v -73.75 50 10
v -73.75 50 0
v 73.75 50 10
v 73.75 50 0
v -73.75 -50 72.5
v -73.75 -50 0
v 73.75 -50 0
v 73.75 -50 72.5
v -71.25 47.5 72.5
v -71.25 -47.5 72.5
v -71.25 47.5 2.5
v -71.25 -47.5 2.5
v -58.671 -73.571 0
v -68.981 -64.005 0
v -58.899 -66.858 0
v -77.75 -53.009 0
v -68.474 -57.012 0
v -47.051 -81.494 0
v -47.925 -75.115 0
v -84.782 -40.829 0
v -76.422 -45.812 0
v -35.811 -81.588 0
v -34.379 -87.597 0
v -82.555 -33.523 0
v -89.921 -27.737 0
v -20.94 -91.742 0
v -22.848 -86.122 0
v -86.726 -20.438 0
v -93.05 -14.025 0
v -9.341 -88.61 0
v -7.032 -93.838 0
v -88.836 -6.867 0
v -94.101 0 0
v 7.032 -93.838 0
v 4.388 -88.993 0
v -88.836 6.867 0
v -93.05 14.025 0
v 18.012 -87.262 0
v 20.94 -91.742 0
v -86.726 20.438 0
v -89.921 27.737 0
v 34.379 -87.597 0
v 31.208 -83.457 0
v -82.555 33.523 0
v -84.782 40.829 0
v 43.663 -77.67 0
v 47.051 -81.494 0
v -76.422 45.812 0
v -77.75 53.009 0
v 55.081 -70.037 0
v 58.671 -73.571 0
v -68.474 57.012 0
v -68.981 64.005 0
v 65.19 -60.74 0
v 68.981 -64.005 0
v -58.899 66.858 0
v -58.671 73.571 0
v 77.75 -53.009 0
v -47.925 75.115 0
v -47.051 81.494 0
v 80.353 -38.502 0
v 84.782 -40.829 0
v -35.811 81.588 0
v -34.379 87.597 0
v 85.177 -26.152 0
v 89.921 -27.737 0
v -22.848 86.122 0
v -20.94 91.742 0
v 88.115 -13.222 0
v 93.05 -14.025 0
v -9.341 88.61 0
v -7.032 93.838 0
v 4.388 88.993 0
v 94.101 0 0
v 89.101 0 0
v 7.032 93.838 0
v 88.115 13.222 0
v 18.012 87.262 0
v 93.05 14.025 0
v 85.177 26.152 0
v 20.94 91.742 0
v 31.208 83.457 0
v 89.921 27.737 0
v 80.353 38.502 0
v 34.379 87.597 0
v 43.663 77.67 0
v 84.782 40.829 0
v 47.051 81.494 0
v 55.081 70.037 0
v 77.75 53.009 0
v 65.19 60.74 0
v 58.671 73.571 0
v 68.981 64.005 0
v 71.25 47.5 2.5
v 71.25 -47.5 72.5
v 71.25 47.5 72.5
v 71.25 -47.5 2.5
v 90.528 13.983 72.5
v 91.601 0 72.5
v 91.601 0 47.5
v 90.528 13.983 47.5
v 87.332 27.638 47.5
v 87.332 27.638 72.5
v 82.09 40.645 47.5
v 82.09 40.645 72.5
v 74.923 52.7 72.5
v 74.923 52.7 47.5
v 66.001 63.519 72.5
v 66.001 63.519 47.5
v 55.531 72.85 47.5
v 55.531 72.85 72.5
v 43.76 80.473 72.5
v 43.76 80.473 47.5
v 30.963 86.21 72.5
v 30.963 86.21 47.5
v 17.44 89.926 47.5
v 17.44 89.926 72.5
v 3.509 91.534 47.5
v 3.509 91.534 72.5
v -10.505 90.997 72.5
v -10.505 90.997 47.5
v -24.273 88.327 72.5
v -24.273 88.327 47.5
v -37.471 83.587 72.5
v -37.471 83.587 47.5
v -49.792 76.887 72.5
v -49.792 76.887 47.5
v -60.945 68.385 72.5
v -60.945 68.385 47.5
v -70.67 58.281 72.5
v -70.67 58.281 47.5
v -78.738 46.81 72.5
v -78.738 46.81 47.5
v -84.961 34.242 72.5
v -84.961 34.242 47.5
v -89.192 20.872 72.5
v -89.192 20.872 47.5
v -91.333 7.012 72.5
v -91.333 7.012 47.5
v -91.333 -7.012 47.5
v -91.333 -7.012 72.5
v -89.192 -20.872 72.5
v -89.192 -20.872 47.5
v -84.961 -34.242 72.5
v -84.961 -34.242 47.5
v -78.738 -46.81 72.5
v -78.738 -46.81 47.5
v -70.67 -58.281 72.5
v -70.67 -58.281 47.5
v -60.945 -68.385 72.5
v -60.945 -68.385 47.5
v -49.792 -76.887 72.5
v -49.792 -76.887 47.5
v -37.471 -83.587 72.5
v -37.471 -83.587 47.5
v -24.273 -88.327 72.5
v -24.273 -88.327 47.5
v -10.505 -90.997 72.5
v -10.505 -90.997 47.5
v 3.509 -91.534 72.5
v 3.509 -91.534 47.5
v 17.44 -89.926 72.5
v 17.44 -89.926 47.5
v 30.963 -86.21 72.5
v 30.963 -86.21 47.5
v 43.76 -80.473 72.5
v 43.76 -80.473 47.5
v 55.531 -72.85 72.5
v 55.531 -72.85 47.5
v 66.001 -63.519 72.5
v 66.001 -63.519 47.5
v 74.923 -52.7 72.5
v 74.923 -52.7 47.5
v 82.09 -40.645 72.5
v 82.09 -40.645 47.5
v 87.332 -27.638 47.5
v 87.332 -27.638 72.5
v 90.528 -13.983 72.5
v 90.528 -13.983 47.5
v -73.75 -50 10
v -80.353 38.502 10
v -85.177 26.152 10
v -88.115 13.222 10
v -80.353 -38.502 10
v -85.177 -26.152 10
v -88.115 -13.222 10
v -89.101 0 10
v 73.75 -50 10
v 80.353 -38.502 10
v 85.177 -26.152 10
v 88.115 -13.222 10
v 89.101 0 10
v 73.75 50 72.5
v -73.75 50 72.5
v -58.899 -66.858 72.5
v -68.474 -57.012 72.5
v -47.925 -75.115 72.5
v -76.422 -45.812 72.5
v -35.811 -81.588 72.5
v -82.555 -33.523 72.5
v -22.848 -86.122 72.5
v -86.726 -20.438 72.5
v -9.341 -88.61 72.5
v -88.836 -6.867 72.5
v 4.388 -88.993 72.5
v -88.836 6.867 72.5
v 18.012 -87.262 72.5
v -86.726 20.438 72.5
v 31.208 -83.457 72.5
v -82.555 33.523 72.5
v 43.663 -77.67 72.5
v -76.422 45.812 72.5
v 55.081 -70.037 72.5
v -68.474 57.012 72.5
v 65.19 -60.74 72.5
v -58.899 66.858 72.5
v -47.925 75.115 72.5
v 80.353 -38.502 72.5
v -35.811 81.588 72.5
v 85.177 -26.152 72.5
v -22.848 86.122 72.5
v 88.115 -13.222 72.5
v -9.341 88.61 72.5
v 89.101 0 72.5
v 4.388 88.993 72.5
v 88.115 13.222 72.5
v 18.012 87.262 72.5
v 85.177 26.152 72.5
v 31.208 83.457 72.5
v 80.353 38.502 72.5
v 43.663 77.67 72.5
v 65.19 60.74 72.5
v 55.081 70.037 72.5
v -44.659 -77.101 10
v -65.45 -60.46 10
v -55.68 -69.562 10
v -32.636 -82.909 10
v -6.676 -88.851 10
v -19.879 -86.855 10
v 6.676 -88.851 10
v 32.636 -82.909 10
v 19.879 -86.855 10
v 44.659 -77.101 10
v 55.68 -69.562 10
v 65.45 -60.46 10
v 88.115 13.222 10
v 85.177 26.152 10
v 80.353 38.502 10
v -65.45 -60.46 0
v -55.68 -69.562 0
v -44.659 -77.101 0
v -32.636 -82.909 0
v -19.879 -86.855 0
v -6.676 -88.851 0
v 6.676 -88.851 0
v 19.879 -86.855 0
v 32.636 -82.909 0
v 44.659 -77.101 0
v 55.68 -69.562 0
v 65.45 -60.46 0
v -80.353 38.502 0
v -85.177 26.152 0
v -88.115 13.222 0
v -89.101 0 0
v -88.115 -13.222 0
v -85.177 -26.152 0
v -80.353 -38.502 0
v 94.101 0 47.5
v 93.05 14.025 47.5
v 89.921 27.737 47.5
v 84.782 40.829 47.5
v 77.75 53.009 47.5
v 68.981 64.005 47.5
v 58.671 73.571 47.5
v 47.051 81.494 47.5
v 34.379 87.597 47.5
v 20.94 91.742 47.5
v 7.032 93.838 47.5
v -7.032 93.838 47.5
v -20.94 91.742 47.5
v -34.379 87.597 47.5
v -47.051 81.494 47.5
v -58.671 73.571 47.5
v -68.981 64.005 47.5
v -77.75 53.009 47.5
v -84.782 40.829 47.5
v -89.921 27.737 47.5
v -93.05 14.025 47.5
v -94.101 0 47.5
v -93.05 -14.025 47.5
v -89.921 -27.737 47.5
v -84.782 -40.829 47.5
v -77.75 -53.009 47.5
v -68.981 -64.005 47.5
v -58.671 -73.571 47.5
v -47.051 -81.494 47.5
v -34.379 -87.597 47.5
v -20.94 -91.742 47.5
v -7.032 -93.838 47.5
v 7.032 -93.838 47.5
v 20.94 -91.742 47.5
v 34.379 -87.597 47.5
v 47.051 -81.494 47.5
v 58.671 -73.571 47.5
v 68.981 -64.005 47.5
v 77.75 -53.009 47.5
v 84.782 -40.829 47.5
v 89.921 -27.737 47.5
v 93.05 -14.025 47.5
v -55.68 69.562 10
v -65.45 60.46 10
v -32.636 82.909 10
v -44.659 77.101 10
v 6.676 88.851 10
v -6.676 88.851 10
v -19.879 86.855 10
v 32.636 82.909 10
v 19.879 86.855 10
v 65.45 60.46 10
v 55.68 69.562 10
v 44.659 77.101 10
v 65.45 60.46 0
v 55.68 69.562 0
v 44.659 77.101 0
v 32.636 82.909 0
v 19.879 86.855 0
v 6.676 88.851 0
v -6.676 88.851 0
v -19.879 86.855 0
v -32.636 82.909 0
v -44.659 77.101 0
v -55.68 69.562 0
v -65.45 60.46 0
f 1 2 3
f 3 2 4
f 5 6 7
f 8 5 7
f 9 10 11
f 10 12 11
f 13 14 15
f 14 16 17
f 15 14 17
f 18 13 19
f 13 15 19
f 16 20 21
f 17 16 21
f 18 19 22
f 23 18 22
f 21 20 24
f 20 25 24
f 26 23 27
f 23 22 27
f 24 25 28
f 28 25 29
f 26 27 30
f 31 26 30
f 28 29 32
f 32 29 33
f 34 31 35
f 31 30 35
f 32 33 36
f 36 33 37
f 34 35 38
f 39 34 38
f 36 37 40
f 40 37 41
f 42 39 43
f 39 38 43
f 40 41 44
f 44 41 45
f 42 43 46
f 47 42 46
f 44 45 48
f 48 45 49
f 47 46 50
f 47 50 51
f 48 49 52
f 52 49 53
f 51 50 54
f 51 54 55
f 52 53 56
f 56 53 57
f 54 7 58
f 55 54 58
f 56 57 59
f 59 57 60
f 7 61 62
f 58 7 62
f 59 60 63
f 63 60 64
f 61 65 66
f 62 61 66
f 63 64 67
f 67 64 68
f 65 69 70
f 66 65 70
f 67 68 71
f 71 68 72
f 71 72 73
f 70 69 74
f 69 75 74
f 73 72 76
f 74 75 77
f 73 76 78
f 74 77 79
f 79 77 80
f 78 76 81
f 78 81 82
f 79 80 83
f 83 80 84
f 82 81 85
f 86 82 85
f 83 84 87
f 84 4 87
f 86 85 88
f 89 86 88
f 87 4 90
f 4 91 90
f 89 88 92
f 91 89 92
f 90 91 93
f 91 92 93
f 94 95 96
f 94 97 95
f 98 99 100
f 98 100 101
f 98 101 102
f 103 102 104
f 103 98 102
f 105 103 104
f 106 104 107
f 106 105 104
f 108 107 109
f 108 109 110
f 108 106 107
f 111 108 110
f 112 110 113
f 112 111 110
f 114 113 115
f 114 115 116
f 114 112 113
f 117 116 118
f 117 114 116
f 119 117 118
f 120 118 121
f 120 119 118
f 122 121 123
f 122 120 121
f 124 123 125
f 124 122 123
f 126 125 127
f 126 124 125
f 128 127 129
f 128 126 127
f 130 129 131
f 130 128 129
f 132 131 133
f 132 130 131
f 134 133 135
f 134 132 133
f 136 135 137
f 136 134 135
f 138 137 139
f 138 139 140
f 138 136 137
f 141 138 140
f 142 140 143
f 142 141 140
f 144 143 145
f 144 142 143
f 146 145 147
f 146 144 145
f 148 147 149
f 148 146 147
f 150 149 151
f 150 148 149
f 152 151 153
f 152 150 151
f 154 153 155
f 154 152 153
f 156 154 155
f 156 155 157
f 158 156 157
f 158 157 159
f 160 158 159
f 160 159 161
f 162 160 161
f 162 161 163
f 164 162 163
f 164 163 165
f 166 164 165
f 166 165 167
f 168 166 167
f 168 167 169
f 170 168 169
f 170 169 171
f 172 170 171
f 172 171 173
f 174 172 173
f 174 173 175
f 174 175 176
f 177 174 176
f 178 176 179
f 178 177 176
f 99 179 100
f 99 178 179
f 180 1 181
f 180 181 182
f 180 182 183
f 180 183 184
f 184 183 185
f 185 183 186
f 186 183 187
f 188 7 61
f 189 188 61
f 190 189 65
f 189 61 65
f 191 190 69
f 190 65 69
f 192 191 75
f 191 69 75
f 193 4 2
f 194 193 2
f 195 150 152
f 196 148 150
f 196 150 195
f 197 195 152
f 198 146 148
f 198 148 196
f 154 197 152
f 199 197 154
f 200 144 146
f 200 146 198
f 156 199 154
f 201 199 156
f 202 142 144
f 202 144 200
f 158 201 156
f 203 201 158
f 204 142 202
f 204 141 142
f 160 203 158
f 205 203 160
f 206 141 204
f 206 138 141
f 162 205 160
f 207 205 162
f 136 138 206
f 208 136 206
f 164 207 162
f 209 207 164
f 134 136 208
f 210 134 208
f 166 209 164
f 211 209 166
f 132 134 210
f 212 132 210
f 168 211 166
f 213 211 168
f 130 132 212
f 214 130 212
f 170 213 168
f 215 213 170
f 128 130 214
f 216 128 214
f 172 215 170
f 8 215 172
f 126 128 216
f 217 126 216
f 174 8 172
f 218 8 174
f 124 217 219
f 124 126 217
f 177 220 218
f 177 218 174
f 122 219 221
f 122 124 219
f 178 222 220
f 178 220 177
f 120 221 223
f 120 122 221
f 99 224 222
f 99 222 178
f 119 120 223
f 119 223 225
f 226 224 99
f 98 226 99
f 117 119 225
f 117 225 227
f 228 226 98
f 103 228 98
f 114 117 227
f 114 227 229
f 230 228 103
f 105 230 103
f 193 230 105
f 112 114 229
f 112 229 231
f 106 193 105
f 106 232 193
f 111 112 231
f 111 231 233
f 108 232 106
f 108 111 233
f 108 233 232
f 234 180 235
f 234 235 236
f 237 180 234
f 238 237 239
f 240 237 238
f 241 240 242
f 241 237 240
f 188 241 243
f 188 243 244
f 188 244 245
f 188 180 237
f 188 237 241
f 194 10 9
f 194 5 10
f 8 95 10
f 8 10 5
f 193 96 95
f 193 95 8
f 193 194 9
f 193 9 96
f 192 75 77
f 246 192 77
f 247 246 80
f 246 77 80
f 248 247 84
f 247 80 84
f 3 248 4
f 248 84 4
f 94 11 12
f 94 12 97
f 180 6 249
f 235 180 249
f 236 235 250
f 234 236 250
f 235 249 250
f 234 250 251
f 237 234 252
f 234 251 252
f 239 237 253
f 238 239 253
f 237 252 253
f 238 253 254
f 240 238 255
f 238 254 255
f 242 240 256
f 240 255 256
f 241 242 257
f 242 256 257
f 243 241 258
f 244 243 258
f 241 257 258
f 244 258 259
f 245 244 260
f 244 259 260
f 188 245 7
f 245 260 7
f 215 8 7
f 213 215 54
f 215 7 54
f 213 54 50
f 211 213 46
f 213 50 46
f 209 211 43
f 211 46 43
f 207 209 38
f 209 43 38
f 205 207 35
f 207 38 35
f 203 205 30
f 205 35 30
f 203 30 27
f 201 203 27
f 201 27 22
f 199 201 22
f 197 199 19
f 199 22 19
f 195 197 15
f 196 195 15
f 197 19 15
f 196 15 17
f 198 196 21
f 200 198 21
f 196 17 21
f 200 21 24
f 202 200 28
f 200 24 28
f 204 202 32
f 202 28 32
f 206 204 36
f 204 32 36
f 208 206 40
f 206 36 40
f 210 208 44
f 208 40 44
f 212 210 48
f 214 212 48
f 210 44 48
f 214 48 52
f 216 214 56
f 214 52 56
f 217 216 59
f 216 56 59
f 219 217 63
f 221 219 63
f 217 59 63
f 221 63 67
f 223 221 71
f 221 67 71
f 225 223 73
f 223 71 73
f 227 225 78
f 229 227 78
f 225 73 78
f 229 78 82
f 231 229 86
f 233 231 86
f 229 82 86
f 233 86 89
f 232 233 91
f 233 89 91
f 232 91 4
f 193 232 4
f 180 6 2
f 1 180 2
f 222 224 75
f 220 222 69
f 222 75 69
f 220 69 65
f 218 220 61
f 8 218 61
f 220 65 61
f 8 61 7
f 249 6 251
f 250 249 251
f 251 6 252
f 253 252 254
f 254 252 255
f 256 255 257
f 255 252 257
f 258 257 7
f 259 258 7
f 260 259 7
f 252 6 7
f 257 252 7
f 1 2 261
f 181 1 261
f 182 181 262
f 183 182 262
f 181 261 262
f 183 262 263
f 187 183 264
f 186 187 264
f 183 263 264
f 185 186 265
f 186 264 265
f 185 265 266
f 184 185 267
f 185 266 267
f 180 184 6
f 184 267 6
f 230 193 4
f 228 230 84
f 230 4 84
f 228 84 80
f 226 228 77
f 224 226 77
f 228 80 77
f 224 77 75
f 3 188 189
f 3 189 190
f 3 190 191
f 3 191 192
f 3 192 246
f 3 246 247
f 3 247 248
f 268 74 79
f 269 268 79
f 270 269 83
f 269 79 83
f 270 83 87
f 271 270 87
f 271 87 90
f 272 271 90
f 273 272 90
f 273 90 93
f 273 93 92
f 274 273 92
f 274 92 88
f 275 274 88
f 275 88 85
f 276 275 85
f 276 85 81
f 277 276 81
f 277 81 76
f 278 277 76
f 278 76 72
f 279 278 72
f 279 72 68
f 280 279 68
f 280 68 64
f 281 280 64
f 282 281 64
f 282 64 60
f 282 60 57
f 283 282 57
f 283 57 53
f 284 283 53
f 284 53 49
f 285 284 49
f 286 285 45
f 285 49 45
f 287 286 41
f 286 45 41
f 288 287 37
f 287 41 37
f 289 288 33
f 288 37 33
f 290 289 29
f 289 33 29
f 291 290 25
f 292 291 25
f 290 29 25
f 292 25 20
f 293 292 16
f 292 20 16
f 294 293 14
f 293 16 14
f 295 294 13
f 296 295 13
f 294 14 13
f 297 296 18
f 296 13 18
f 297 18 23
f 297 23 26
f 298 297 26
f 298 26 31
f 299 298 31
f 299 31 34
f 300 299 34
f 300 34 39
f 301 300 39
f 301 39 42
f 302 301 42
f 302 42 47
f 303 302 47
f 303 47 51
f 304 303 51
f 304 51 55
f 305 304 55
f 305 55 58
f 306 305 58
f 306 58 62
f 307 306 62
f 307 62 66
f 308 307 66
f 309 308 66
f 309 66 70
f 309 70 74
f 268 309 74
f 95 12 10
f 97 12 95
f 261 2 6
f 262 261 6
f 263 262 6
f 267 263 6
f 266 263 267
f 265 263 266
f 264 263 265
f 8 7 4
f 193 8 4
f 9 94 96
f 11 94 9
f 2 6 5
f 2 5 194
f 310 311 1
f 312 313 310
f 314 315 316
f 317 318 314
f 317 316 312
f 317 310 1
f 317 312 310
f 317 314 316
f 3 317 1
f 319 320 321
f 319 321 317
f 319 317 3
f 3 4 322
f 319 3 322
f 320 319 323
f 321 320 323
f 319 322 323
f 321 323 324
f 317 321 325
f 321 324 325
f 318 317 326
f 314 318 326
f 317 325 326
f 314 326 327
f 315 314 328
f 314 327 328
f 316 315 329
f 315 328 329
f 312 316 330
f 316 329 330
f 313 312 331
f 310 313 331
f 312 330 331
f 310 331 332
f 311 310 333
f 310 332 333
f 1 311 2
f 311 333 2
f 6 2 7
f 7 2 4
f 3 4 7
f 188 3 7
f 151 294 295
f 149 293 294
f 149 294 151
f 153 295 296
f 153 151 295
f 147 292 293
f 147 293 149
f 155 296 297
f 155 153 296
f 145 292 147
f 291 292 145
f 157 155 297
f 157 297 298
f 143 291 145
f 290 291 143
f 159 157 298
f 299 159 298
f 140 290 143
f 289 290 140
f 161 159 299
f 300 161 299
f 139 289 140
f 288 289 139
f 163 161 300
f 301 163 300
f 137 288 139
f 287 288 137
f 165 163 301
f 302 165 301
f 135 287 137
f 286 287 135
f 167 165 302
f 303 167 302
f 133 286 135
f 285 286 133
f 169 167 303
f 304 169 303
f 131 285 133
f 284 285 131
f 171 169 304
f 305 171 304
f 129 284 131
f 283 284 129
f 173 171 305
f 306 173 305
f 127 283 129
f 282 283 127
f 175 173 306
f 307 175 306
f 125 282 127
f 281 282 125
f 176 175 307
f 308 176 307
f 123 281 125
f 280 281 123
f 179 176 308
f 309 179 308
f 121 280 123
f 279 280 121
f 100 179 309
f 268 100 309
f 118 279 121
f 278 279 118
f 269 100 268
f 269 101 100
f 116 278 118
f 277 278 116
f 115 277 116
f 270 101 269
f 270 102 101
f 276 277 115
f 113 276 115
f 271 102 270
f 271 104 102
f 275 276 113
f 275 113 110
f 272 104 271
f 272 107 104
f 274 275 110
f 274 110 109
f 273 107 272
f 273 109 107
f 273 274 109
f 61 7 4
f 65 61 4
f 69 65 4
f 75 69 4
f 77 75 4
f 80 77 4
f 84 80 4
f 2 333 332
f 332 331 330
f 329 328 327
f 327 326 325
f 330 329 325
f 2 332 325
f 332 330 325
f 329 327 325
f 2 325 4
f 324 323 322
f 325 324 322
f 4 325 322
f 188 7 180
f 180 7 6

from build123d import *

# Parameters (mm, degrees)
F0_R     = 94.101416936
F1_DEPTH = 72.5
F0_W     = 72.5
F0_H     = 100
F0_W_2   = 2.5
F2_T     = -2.5
F4_DEPTH = 10
F5_R     = 94.101416936
F5_R_2   = 91.601416936
F6_DEPTH = 25


# Not quite as in the source:
# - the program builds the solid bodies; features that only make, move or delete a surface that nothing else refers to are left out


with BuildPart() as f1:
    # F0 (on Top) → F1 (new body)
    with BuildSketch(Plane.XY):
        Circle(F0_R)
        with BuildLine():
            ThreePointArc((89.101416936, 0), (85.177144819, -26.1517972707), (73.75, -50))
            ThreePointArc((73.75, -50), (0, -89.101416936), (-73.75, -50))
            ThreePointArc((-73.75, -50), (-89.101416936, 0), (-73.75, 50))
            ThreePointArc((-73.75, 50), (0, 89.101416936), (73.75, 50))
            ThreePointArc((73.75, 50), (85.177144819, 26.1517972707), (89.101416936, 0))
        make_face(mode=Mode.SUBTRACT)
    extrude(amount=F1_DEPTH)

    # F5 (on face) → F6 (cut)
    with BuildSketch(Plane.XY.offset(72.5)):
        Circle(F5_R)
        Circle(F5_R_2, mode=Mode.SUBTRACT)
    extrude(amount=-F6_DEPTH, mode=Mode.SUBTRACT)


with BuildPart() as f1b:
    # F0 (on Top) → F1, piece 2 (new body)
    with BuildSketch(Plane.XY):
        with Locations((-37.5, 0)):
            Rectangle(F0_W, F0_H)
        with Locations((37.5, 0)):
            Rectangle(F0_W, F0_H)
        Rectangle(F0_W_2, F0_H)
    extrude(amount=F1_DEPTH)

    # F2
    f2_openings = [f1b.faces().sort_by_distance(p)[0] for p in [
        (0, 0, 72.5),
    ]]
    offset(amount=F2_T, openings=f2_openings)


with BuildPart() as f4:
    # F0 (on Top) → F4 (new body)
    with BuildSketch(Plane.XY):
        with BuildLine():
            ThreePointArc((-73.75, 50), (-89.101416936, 0), (-73.75, -50))
            Line((-73.75, -50), (-73.75, 50))
        make_face()
    extrude(amount=F4_DEPTH)


with BuildPart() as f4b:
    # F0 (on Top) → F4, piece 2 (new body)
    with BuildSketch(Plane.XY):
        with BuildLine():
            Line((73.75, 50), (73.75, -50))
            ThreePointArc((73.75, -50), (85.177144819, -26.1517972707), (89.101416936, 0))
            ThreePointArc((89.101416936, 0), (85.177144819, 26.1517972707), (73.75, 50))
        make_face()
    extrude(amount=F4_DEPTH)


with BuildPart() as f4c:
    # F0 (on Top) → F4, piece 3 (new body)
    with BuildSketch(Plane.XY):
        with BuildLine():
            Line((1.25, 50), (73.75, 50))
            ThreePointArc((73.75, 50), (0, 89.101416936), (-73.75, 50))
            Line((-73.75, 50), (-1.25, 50))
            Line((-1.25, 50), (1.25, 50))
        make_face()
    extrude(amount=F4_DEPTH)


with BuildPart() as f4d:
    # F0 (on Top) → F4, piece 4 (new body)
    with BuildSketch(Plane.XY):
        with BuildLine():
            ThreePointArc((-73.75, -50), (0, -89.101416936), (73.75, -50))
            Line((73.75, -50), (1.25, -50))
            Line((1.25, -50), (-1.25, -50))
            Line((-1.25, -50), (-73.75, -50))
        make_face()
    extrude(amount=F4_DEPTH)


solid = Compound([f1.part, f1b.part, f4.part, f4b.part, f4c.part, f4d.part])
